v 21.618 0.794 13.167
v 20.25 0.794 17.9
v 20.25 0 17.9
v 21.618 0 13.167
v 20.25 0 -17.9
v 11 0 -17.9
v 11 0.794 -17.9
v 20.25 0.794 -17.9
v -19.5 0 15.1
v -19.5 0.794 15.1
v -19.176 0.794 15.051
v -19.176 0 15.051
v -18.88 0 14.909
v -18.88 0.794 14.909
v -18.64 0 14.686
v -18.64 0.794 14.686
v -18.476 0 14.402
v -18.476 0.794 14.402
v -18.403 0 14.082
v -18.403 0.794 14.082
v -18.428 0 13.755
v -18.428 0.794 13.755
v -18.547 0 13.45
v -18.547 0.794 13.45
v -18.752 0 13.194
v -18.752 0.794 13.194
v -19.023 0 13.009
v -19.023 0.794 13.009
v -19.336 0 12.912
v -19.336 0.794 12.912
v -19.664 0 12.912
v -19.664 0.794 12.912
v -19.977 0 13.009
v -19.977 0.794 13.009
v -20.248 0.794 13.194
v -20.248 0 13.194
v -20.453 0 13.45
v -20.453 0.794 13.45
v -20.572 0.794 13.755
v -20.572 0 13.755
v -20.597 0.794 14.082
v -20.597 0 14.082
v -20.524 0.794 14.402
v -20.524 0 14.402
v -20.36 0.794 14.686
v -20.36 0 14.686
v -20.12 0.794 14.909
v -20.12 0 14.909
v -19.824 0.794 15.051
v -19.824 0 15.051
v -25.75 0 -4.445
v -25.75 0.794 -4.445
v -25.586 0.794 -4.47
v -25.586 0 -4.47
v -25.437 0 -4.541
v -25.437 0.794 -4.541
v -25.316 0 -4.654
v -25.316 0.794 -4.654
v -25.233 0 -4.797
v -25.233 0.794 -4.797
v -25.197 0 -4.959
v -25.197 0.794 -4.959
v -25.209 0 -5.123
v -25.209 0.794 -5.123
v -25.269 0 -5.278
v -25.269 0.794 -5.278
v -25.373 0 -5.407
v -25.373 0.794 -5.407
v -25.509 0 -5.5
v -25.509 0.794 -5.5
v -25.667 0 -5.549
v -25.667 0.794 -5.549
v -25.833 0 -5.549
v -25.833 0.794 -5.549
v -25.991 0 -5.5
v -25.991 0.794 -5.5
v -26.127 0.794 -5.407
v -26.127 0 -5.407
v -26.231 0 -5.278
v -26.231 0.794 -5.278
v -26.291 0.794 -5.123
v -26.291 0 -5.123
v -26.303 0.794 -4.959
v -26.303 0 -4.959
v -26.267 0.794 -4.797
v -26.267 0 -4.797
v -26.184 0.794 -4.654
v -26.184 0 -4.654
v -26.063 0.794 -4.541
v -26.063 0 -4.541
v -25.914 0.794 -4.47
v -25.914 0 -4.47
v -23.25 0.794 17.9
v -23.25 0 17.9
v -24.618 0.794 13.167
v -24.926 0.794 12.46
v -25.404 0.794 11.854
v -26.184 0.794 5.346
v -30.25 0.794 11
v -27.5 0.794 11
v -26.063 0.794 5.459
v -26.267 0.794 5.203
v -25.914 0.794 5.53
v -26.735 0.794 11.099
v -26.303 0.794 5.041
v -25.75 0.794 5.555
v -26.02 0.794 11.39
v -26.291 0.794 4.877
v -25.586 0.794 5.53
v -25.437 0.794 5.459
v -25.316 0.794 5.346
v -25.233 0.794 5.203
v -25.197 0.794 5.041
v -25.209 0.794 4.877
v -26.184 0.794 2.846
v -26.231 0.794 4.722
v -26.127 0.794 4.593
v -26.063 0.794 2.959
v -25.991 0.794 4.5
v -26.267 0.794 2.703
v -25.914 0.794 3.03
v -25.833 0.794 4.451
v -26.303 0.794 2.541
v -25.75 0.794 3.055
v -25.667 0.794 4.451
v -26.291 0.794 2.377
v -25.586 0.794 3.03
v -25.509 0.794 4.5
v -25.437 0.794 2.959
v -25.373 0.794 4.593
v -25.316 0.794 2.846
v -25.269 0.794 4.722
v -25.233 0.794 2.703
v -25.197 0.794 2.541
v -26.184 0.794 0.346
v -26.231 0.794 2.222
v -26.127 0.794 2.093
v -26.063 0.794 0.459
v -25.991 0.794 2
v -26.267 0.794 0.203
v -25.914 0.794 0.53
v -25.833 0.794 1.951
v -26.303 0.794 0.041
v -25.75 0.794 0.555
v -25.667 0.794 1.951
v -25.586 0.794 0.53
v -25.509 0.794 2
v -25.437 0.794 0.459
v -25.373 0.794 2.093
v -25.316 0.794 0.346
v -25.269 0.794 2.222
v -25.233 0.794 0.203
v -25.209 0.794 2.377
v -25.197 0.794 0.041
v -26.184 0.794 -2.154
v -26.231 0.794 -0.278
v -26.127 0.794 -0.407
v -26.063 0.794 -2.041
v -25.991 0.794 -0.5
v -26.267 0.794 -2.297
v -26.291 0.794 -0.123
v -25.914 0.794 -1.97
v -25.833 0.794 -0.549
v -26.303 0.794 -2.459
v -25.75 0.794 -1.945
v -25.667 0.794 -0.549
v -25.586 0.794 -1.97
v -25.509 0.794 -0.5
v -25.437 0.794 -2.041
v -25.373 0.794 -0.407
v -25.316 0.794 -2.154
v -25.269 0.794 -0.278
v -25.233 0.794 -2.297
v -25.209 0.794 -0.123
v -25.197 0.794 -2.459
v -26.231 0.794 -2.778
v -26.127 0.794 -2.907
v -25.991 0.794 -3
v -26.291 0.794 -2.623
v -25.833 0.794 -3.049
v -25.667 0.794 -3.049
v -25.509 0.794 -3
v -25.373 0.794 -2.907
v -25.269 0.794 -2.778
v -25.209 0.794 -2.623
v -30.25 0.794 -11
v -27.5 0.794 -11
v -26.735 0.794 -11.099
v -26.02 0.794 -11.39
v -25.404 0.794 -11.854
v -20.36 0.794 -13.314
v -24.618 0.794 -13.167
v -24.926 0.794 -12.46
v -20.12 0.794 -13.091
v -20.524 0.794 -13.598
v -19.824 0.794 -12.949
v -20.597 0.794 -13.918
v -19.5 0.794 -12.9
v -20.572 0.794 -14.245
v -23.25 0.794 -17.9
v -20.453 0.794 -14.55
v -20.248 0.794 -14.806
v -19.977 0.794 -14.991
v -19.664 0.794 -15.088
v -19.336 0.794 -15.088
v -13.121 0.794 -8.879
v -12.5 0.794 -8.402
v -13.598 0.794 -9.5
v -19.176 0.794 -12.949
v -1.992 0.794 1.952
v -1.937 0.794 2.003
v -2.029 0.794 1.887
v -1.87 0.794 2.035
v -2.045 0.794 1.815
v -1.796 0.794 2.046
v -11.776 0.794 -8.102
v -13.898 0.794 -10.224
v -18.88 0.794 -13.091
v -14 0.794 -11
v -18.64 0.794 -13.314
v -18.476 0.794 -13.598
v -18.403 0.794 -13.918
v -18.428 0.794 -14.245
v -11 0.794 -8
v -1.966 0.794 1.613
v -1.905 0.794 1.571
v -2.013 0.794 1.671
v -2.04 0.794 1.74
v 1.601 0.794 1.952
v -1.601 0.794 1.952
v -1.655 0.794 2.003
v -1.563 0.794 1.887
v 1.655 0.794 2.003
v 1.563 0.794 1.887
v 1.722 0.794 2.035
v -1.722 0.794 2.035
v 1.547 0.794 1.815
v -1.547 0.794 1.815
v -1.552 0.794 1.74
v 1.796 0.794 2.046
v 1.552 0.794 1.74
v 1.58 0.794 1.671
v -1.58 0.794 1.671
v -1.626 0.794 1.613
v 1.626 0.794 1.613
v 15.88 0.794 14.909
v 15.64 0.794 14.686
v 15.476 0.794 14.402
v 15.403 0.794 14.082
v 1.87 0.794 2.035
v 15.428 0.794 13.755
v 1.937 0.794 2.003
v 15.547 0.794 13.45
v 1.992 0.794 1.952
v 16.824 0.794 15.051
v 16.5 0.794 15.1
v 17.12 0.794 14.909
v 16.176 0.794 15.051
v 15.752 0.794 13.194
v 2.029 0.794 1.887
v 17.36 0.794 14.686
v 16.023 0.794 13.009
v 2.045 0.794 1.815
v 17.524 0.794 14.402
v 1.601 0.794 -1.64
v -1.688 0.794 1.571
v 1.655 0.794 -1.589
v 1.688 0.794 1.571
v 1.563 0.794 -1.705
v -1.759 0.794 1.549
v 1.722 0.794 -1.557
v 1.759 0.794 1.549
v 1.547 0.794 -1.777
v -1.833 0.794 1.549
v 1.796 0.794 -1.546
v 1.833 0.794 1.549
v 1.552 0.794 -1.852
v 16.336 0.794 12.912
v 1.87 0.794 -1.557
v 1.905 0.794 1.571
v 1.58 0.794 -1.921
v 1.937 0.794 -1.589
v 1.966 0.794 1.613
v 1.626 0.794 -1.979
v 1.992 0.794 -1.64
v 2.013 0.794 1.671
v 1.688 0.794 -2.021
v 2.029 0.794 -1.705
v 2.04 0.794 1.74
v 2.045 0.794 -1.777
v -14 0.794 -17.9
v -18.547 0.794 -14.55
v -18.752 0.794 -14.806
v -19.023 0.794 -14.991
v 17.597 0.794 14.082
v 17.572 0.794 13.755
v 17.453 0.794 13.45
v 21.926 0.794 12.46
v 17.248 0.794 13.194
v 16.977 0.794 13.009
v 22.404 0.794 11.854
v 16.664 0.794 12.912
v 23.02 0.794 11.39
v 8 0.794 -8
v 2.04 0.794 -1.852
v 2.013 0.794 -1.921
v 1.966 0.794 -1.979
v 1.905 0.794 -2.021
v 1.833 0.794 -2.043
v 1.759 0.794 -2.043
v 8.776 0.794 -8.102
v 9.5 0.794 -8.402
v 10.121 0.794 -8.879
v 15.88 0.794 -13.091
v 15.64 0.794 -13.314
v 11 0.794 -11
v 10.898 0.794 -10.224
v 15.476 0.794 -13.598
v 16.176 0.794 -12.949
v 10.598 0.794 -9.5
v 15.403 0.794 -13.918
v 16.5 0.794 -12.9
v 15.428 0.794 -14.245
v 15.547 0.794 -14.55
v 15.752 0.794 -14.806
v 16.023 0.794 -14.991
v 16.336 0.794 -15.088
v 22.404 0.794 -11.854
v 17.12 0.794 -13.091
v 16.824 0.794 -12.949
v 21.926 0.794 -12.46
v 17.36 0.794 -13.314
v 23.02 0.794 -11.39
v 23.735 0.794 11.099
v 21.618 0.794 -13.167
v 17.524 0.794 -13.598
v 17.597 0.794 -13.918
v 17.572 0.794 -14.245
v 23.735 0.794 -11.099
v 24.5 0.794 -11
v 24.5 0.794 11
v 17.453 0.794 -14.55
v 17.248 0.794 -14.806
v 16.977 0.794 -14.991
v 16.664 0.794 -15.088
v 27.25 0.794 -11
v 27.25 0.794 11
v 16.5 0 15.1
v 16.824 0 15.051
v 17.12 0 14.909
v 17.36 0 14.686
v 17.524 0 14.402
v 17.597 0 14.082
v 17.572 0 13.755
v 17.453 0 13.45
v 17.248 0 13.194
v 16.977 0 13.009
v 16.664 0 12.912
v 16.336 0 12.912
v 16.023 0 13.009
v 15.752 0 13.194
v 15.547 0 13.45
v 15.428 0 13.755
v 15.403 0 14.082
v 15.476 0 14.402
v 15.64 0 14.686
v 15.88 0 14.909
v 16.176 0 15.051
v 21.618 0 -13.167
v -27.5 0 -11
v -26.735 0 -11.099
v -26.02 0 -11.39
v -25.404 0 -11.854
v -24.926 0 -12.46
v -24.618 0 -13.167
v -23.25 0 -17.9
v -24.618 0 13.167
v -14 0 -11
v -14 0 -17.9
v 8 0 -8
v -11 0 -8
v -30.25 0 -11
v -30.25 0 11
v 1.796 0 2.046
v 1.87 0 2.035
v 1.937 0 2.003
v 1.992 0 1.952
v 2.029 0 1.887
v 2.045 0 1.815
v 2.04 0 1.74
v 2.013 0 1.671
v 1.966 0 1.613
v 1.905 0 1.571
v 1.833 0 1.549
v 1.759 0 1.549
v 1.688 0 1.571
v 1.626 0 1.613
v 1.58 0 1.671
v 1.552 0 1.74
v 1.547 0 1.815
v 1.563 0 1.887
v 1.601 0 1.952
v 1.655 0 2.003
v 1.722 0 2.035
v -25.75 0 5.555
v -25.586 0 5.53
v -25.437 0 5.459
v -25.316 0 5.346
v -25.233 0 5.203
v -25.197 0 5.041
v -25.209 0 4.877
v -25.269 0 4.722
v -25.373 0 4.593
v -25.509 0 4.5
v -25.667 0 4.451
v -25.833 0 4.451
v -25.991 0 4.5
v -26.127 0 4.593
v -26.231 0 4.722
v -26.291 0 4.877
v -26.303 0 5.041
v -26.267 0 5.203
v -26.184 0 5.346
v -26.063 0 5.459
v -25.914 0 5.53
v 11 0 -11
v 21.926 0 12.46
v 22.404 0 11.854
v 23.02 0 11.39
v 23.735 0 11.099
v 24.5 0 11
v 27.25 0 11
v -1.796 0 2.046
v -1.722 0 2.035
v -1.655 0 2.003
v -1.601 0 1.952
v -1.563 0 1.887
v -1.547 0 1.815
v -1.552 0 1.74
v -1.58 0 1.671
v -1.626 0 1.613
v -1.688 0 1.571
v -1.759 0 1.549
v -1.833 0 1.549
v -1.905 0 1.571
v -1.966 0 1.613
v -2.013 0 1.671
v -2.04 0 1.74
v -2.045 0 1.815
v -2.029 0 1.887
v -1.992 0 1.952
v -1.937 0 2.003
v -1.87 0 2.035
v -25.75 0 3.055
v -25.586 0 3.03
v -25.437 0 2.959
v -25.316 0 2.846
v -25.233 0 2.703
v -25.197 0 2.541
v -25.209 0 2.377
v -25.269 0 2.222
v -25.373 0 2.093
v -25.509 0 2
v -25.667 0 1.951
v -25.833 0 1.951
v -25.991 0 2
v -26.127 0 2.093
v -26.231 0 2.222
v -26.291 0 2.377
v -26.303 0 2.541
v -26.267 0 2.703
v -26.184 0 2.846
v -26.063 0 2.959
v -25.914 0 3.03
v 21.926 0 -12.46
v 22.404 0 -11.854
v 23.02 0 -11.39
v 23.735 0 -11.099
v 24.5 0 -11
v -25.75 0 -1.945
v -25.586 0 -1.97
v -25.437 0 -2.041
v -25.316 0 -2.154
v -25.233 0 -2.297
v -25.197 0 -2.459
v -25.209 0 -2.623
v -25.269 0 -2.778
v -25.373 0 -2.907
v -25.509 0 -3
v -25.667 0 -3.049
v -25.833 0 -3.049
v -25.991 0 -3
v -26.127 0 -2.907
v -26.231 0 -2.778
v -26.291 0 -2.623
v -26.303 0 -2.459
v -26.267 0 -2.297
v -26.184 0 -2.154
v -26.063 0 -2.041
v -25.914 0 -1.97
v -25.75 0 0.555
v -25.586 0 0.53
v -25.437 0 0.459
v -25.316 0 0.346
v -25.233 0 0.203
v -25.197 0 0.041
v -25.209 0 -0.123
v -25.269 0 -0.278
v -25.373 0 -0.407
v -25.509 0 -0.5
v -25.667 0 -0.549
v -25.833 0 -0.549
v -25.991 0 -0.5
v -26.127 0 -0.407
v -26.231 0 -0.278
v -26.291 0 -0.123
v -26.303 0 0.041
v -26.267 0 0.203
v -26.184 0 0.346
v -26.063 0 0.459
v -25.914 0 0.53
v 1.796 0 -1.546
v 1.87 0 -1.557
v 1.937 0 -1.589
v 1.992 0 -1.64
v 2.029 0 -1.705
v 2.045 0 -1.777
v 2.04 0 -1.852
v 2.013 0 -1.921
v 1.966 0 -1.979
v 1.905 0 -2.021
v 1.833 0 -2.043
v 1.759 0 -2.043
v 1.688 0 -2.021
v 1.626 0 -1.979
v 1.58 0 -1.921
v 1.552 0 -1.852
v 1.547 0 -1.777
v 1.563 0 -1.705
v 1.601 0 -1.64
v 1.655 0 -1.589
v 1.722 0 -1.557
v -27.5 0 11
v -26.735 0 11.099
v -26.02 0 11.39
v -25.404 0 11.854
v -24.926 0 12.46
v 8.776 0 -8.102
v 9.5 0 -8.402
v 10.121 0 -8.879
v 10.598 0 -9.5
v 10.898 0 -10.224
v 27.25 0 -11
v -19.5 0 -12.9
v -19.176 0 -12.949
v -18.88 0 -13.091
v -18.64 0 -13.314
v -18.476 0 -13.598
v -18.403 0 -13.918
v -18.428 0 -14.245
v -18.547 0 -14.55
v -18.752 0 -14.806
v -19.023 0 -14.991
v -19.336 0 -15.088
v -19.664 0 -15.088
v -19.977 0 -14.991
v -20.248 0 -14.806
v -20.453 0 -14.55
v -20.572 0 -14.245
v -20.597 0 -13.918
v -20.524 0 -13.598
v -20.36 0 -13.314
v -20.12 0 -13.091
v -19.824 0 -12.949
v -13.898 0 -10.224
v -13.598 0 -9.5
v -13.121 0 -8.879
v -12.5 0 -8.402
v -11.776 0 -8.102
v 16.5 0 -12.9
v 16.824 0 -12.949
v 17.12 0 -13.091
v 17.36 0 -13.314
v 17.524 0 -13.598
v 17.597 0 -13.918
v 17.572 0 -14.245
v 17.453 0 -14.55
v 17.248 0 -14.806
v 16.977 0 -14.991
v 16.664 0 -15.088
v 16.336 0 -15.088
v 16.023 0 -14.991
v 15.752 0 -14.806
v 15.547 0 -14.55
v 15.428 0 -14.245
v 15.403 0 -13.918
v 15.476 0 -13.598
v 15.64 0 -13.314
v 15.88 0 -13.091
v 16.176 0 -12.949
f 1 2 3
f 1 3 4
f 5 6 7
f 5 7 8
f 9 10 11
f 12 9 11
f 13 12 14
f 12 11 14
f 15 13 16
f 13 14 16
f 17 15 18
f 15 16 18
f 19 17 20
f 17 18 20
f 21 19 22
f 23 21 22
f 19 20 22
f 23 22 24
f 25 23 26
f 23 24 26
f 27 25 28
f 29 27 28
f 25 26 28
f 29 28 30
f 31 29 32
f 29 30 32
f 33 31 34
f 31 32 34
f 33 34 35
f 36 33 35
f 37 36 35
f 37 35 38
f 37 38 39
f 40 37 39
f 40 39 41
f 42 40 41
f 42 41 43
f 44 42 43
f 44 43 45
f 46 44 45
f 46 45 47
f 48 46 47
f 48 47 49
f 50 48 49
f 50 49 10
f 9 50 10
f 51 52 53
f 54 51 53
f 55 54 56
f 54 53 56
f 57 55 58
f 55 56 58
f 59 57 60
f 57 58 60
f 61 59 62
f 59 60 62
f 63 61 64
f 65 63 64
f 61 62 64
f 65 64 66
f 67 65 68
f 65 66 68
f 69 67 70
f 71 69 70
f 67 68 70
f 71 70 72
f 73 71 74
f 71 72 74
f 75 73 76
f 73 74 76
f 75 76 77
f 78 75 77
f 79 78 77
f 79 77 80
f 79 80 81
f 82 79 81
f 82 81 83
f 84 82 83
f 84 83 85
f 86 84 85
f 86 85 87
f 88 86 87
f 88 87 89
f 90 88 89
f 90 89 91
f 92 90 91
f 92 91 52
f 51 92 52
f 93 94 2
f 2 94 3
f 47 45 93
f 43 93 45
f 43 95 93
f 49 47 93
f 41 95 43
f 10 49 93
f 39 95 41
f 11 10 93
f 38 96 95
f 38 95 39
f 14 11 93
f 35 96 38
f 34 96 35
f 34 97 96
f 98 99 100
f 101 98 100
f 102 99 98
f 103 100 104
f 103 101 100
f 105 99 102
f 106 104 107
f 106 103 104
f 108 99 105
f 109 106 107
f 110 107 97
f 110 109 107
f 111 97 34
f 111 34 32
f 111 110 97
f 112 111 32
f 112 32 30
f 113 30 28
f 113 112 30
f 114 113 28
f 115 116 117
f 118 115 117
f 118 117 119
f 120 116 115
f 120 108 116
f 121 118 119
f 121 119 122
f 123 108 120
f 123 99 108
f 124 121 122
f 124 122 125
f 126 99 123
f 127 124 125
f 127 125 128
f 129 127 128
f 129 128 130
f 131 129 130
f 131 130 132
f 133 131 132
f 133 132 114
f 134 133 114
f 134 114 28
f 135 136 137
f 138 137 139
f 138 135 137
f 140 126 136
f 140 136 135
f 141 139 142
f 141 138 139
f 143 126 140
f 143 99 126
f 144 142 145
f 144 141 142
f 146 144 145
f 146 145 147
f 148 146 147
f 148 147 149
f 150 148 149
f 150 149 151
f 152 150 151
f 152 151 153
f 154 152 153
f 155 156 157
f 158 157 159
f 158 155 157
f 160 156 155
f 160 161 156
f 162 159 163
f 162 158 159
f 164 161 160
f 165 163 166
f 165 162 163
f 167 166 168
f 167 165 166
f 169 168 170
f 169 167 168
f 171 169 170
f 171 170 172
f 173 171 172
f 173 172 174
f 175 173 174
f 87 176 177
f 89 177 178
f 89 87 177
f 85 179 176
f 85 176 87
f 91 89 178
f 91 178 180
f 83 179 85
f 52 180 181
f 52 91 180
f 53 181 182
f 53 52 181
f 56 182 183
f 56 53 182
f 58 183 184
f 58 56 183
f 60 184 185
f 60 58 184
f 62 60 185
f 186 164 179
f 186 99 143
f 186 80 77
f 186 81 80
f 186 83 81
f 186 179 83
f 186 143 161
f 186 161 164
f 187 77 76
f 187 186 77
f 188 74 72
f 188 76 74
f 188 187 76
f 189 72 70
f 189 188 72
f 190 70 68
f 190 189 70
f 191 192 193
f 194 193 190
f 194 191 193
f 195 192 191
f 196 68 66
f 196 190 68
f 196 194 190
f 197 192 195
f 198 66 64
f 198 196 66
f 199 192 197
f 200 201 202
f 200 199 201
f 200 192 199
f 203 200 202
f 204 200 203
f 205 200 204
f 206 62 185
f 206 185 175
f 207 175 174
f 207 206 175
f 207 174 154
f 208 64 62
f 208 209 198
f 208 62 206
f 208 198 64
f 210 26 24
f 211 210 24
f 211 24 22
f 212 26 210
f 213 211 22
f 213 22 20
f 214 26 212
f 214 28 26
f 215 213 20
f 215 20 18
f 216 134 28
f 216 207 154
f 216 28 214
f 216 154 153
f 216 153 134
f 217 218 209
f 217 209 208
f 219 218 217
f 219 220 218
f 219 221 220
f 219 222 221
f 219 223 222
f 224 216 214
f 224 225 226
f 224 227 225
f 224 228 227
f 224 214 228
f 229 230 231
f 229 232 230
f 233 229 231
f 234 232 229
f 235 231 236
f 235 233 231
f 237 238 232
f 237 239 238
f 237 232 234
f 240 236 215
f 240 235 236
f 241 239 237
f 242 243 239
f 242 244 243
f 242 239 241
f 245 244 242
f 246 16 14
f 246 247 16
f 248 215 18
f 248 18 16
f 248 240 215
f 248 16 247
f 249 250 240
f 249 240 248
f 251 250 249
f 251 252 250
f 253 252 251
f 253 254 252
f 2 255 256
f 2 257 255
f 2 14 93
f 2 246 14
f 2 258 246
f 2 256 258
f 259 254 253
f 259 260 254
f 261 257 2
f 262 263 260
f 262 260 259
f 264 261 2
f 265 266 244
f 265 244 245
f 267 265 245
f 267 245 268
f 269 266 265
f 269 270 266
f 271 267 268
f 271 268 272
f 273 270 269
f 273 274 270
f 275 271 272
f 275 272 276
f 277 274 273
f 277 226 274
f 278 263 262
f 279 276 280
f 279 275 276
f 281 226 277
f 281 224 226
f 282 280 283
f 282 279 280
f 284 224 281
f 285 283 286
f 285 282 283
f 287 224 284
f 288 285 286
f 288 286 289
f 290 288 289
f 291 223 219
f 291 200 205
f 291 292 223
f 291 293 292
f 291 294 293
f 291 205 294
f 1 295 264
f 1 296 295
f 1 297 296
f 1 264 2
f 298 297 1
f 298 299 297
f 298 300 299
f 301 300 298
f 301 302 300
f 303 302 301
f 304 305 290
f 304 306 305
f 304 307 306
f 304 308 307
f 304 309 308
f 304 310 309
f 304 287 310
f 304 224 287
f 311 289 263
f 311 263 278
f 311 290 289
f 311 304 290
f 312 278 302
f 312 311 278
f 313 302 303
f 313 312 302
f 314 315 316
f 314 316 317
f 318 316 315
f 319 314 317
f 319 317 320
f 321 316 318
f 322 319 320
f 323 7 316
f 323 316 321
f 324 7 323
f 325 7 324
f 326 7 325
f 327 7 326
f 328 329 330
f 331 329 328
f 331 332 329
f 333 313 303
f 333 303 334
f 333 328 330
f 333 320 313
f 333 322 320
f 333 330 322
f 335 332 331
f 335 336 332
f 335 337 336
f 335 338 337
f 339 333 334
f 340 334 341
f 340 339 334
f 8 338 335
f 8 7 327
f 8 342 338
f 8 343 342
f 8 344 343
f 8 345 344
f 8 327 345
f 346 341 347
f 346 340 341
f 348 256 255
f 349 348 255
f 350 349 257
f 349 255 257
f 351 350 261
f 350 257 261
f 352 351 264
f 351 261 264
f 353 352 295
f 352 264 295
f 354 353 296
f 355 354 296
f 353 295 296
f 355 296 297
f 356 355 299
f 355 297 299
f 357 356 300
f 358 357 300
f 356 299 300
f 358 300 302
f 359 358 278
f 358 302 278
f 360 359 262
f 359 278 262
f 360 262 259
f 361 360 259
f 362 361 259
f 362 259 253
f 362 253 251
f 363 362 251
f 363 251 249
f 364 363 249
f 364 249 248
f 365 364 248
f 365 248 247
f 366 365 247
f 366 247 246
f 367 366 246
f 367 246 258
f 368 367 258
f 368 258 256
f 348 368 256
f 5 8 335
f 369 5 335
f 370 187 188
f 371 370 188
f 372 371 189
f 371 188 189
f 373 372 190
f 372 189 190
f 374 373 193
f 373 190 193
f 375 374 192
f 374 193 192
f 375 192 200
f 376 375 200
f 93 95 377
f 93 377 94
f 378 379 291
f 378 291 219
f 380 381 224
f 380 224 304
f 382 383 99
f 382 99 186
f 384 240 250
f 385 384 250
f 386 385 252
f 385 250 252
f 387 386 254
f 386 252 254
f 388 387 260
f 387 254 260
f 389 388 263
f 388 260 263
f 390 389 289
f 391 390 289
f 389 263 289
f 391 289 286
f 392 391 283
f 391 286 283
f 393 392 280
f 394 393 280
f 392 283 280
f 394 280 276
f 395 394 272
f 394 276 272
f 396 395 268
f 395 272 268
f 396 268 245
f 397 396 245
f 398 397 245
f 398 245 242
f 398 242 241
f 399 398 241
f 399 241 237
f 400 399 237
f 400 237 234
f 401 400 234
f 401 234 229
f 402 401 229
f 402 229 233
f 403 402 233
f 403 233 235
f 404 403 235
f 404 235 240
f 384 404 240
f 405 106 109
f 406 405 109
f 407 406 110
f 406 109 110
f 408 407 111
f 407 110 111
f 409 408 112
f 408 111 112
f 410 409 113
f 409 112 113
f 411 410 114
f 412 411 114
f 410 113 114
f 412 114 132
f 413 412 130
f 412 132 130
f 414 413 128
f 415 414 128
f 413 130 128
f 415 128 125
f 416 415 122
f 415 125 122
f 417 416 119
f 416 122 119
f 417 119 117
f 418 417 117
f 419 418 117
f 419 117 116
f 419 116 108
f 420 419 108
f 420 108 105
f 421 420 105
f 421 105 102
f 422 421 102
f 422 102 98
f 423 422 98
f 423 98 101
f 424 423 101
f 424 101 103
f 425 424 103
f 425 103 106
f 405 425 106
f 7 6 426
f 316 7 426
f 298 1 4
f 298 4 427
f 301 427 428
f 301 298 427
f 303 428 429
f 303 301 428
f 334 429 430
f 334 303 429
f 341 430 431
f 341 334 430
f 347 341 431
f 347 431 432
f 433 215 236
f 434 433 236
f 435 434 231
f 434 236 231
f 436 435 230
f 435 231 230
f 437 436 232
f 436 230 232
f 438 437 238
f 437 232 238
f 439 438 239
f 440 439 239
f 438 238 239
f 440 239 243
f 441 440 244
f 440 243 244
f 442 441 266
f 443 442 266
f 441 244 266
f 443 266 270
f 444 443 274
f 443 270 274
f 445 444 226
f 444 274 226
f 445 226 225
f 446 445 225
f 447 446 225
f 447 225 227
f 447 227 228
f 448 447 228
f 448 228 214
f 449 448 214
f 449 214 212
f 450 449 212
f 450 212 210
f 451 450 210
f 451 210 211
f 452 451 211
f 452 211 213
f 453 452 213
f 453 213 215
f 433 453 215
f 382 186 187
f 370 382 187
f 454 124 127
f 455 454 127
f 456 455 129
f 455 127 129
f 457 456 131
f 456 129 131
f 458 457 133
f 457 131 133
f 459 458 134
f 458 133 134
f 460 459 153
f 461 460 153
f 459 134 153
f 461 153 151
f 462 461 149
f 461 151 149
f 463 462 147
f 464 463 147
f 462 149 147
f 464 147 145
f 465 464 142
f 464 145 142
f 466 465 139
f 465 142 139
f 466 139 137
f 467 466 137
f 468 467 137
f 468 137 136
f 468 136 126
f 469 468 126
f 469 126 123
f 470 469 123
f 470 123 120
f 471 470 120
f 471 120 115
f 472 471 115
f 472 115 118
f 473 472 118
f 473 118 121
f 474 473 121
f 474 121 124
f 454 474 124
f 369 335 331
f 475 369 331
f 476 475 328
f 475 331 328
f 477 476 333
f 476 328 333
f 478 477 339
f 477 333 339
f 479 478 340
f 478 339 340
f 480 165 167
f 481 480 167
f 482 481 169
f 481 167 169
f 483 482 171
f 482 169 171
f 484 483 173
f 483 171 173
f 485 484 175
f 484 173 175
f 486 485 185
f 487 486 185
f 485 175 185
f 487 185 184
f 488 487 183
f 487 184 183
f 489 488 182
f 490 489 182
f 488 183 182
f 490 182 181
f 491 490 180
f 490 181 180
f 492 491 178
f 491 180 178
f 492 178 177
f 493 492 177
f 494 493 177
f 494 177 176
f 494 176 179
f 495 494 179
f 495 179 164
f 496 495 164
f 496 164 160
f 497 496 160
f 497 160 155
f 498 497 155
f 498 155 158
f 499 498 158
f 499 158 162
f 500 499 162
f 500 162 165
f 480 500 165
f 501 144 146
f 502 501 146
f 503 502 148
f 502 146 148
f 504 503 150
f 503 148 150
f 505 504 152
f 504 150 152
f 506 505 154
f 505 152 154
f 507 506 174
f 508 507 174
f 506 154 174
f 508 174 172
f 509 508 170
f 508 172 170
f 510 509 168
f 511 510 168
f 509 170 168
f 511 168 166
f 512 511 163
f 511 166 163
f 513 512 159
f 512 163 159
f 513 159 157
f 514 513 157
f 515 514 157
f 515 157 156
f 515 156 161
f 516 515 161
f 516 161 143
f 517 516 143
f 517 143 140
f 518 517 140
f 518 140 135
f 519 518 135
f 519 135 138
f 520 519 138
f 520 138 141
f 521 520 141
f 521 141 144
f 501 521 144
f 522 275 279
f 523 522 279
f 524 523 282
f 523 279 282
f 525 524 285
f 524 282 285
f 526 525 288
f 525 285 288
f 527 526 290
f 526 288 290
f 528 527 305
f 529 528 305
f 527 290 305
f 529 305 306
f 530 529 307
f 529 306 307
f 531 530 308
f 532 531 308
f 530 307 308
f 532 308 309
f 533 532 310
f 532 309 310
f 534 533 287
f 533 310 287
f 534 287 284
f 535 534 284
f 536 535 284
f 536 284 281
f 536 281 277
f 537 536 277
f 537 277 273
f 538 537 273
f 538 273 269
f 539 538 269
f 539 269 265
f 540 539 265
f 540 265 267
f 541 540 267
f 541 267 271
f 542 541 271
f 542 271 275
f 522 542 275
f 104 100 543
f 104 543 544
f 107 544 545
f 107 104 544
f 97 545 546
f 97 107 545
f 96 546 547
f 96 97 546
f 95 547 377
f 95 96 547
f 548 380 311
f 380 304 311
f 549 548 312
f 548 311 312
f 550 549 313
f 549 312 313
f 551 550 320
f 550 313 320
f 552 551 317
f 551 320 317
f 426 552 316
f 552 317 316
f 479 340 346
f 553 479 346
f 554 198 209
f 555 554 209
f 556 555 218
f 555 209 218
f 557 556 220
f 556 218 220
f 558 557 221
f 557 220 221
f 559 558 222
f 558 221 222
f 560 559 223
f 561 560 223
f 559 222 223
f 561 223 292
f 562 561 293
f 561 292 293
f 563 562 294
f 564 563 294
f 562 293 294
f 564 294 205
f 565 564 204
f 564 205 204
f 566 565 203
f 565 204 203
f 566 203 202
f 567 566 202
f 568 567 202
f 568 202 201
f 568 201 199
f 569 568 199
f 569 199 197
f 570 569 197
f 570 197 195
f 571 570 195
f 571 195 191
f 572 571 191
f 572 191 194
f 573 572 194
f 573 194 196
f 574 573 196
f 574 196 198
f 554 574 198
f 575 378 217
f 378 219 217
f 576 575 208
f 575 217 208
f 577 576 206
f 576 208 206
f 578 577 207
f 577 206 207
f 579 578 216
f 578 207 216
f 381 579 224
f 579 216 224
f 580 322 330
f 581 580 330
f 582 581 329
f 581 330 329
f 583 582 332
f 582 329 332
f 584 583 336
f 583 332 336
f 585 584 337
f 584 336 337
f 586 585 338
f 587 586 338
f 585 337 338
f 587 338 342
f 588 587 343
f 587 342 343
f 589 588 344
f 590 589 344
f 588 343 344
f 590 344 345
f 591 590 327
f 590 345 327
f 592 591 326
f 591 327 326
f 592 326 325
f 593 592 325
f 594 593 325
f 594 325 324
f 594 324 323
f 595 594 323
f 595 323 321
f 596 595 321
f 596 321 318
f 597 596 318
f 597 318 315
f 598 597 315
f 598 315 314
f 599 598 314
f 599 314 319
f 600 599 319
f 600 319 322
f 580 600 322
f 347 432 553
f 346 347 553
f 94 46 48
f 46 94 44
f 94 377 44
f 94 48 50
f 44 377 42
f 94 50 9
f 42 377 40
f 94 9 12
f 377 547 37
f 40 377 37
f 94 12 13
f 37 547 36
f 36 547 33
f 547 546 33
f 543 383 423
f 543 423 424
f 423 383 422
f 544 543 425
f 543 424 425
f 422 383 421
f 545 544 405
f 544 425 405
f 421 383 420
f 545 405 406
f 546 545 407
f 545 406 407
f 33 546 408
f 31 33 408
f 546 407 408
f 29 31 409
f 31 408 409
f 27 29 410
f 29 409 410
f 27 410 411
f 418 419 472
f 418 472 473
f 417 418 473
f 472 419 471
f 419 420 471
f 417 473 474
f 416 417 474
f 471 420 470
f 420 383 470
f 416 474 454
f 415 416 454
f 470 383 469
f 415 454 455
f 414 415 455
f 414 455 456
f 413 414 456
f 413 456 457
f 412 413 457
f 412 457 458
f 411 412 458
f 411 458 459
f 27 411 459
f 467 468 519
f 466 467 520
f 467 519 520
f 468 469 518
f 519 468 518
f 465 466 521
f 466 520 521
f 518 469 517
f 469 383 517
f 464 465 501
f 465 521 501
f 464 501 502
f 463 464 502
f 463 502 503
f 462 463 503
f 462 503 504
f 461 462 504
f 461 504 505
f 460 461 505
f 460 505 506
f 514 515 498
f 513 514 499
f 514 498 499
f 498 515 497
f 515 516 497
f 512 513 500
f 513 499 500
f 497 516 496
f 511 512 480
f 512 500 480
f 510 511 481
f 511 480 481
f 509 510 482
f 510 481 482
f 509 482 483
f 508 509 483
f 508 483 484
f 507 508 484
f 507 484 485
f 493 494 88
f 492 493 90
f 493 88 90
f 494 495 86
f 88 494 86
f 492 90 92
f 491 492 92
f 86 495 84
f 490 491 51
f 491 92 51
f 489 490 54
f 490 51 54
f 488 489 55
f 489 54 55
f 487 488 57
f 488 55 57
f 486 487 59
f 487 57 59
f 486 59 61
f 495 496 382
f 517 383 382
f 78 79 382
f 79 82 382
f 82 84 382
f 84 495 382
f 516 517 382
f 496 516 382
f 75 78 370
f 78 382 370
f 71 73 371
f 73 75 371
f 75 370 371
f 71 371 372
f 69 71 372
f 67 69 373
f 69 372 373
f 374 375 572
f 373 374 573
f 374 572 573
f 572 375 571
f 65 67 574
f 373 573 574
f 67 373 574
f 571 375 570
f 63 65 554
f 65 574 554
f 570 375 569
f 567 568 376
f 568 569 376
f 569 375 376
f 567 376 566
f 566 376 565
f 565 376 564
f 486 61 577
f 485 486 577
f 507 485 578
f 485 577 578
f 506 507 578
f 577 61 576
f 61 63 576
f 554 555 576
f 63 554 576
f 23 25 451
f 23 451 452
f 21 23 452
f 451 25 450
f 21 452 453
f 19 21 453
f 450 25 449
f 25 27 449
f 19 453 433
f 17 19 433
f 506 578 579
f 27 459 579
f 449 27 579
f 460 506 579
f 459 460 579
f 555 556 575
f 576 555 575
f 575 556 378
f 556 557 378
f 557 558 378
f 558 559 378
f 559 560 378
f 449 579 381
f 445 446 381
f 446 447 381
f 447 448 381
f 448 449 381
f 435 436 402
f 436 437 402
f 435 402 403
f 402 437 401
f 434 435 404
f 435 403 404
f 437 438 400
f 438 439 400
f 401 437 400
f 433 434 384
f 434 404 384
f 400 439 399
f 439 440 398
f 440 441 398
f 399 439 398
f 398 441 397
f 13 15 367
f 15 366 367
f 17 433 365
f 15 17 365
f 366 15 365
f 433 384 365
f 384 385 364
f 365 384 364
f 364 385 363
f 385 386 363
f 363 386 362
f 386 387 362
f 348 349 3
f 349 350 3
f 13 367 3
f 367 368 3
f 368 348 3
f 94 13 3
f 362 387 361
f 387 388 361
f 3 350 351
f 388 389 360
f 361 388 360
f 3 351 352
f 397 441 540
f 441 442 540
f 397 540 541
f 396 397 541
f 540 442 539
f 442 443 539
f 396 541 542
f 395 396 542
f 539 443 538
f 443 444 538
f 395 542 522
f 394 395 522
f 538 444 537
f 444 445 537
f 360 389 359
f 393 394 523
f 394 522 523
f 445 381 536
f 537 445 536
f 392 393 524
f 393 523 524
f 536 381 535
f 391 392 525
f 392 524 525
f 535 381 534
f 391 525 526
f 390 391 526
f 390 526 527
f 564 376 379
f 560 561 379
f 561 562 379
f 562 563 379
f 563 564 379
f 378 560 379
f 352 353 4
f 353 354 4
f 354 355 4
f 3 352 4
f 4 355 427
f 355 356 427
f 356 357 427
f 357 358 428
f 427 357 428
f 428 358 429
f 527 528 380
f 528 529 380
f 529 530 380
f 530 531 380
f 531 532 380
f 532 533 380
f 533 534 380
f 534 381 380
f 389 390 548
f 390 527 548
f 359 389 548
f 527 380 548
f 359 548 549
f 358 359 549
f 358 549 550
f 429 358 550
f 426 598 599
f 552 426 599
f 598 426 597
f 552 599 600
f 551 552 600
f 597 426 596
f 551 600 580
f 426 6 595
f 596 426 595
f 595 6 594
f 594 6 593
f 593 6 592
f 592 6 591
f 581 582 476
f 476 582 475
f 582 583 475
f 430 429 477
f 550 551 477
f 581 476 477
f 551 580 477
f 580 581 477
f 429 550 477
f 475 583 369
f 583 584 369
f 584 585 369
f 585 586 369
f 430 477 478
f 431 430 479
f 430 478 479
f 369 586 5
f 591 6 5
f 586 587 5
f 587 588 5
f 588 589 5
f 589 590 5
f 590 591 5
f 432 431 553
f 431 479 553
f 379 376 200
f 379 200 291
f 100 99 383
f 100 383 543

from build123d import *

# Parameters (mm, degrees)
SKETCH1_W                             = 57.5
SKETCH1_H                             = 35.8
BASE_EXTRUSION_DEPTH                  = 0.79375
SKETCH2_R                             = 0.25
PIR_MOUNTING_HOLES_DEPTH              = 36.158249943
SKETCH3_R                             = 0.555
CONNECTOR_MOUNTING_HOLE_DEPTH         = 36.158249943
CONNECTOR_MOUNTING_HOLE_PATTERN_COUNT = 5
CONNECTOR_MOUNTING_HOLE_PATTERN_PITCH = 2.5
SKETCH4_W                             = 25
SKETCH4_H                             = 9.9
LED_DRIVER_CLEARANCE_CUT_DEPTH        = 36.158249943
LED_DRIVER_CLEARANCE_CUT_FILLETS_R    = 3
CORNER_CUTOUT_DEPTH                   = 36.158249943
SKETCH7_R                             = 1.1
MOUNTING_SCREW_HOLES_DEPTH            = 36.158249943


with BuildPart() as part:
    # Sketch1 → Base Extrusion (new body)
    with BuildSketch(Plane(origin=(0, 0, 0), x_dir=(1, 0, 0), z_dir=(0, 1, 0))):
        with Locations((-1.5, 0)):
            Rectangle(SKETCH1_W, SKETCH1_H)
    extrude(amount=BASE_EXTRUSION_DEPTH)

    # Sketch2 → PIR Mounting Holes (cut, through all)
    with BuildSketch(Plane(origin=(0, 0.79375, 0), x_dir=(1, 0, 0), z_dir=(0, 1, 0))):
        with Locations(Location((1.796051224, -1.796051224, 0), (0, 0, 270))):
            Circle(SKETCH2_R)
        with Locations(Location((1.796051224, 1.796051224, 0), (0, 0, 270))):
            Circle(SKETCH2_R)
        with Locations(Location((-1.796051224, -1.796051224, 0), (0, 0, 270))):
            Circle(SKETCH2_R)
    extrude(amount=-PIR_MOUNTING_HOLES_DEPTH, mode=Mode.SUBTRACT)

    # Sketch3 → Connector Mounting Hole (cut, through all)
    with BuildSketch(Plane(origin=(0, 0.79375, 0), x_dir=(1, 0, 0), z_dir=(0, 1, 0))):
        with Locations(Location((-25.75, 5, 0), (0, 0, 270))):
            Circle(SKETCH3_R)
    connector_mounting_hole = extrude(amount=-CONNECTOR_MOUNTING_HOLE_DEPTH, mode=Mode.SUBTRACT)

    # Connector Mounting Hole Pattern: Connector Mounting Hole ×5
    with Locations(*[(0, 0, i * CONNECTOR_MOUNTING_HOLE_PATTERN_PITCH) for i in range(1, CONNECTOR_MOUNTING_HOLE_PATTERN_COUNT)]):
        add(connector_mounting_hole, mode=Mode.SUBTRACT)

    # Sketch4 → LED Driver Clearance Cut (cut, through all)
    with BuildSketch(Plane.XZ):
        with Locations((-1.5, -12.95)):
            Rectangle(SKETCH4_W, SKETCH4_H)
    extrude(amount=-LED_DRIVER_CLEARANCE_CUT_DEPTH, mode=Mode.SUBTRACT)

    # LED Driver Clearance Cut Fillets
    led_driver_clearance_cut_fillets_edges = [part.edges().sort_by_distance(p)[0] for p in [
        (-14, 0.396875, -8),
        (11, 0.396875, -8),
    ]]
    fillet(led_driver_clearance_cut_fillets_edges, radius=LED_DRIVER_CLEARANCE_CUT_FILLETS_R)

    # Sketch5 → Corner Cutout (cut, through all)
    with BuildSketch(Plane(origin=(0, 0.79375, 0), x_dir=(1, 0, 0), z_dir=(0, 1, 0))):
        with BuildLine():
            Line((-30.25, 11), (-27.5, 11))
            ThreePointArc((-27.5, 11), (-25.697080654, 11.602192287), (-24.617964056, 13.167012113))
            Line((-24.617964056, 13.167012113), (-23.25, 17.9))
            Line((-23.25, 17.9), (-30.25, 17.9))
            Line((-30.25, 17.9), (-30.25, 11))
        make_face()
        with BuildLine():
            Line((20.25, 17.9), (21.617964056, 13.167012113))
            ThreePointArc((21.617964056, 13.167012113), (22.697080654, 11.602192287), (24.5, 11))
            Line((24.5, 11), (27.25, 11))
            Line((27.25, 11), (27.25, 17.9))
            Line((27.25, 17.9), (20.25, 17.9))
        make_face()
    corner_cutout = extrude(amount=-CORNER_CUTOUT_DEPTH, mode=Mode.SUBTRACT)

    # Corner Cut Mirror: Corner Cutout across plane
    add(corner_cutout.mirror(Plane.XY), mode=Mode.SUBTRACT)

    # Sketch7 → Mounting Screw Holes (cut, through all)
    with BuildSketch(Plane(origin=(0, 0.79375, 0), x_dir=(1, 0, 0), z_dir=(0, 1, 0))):
        with Locations(Location((-19.5, 14, 0), (0, 0, 270))):
            Circle(SKETCH7_R)
        with Locations(Location((-19.5, -14, 0), (0, 0, 270))):
            Circle(SKETCH7_R)
        with Locations(Location((16.5, -14, 0), (0, 0, 270))):
            Circle(SKETCH7_R)
        with Locations(Location((16.5, 14, 0), (0, 0, 270))):
            Circle(SKETCH7_R)
    extrude(amount=-MOUNTING_SCREW_HOLES_DEPTH, mode=Mode.SUBTRACT)


solid = part.part
